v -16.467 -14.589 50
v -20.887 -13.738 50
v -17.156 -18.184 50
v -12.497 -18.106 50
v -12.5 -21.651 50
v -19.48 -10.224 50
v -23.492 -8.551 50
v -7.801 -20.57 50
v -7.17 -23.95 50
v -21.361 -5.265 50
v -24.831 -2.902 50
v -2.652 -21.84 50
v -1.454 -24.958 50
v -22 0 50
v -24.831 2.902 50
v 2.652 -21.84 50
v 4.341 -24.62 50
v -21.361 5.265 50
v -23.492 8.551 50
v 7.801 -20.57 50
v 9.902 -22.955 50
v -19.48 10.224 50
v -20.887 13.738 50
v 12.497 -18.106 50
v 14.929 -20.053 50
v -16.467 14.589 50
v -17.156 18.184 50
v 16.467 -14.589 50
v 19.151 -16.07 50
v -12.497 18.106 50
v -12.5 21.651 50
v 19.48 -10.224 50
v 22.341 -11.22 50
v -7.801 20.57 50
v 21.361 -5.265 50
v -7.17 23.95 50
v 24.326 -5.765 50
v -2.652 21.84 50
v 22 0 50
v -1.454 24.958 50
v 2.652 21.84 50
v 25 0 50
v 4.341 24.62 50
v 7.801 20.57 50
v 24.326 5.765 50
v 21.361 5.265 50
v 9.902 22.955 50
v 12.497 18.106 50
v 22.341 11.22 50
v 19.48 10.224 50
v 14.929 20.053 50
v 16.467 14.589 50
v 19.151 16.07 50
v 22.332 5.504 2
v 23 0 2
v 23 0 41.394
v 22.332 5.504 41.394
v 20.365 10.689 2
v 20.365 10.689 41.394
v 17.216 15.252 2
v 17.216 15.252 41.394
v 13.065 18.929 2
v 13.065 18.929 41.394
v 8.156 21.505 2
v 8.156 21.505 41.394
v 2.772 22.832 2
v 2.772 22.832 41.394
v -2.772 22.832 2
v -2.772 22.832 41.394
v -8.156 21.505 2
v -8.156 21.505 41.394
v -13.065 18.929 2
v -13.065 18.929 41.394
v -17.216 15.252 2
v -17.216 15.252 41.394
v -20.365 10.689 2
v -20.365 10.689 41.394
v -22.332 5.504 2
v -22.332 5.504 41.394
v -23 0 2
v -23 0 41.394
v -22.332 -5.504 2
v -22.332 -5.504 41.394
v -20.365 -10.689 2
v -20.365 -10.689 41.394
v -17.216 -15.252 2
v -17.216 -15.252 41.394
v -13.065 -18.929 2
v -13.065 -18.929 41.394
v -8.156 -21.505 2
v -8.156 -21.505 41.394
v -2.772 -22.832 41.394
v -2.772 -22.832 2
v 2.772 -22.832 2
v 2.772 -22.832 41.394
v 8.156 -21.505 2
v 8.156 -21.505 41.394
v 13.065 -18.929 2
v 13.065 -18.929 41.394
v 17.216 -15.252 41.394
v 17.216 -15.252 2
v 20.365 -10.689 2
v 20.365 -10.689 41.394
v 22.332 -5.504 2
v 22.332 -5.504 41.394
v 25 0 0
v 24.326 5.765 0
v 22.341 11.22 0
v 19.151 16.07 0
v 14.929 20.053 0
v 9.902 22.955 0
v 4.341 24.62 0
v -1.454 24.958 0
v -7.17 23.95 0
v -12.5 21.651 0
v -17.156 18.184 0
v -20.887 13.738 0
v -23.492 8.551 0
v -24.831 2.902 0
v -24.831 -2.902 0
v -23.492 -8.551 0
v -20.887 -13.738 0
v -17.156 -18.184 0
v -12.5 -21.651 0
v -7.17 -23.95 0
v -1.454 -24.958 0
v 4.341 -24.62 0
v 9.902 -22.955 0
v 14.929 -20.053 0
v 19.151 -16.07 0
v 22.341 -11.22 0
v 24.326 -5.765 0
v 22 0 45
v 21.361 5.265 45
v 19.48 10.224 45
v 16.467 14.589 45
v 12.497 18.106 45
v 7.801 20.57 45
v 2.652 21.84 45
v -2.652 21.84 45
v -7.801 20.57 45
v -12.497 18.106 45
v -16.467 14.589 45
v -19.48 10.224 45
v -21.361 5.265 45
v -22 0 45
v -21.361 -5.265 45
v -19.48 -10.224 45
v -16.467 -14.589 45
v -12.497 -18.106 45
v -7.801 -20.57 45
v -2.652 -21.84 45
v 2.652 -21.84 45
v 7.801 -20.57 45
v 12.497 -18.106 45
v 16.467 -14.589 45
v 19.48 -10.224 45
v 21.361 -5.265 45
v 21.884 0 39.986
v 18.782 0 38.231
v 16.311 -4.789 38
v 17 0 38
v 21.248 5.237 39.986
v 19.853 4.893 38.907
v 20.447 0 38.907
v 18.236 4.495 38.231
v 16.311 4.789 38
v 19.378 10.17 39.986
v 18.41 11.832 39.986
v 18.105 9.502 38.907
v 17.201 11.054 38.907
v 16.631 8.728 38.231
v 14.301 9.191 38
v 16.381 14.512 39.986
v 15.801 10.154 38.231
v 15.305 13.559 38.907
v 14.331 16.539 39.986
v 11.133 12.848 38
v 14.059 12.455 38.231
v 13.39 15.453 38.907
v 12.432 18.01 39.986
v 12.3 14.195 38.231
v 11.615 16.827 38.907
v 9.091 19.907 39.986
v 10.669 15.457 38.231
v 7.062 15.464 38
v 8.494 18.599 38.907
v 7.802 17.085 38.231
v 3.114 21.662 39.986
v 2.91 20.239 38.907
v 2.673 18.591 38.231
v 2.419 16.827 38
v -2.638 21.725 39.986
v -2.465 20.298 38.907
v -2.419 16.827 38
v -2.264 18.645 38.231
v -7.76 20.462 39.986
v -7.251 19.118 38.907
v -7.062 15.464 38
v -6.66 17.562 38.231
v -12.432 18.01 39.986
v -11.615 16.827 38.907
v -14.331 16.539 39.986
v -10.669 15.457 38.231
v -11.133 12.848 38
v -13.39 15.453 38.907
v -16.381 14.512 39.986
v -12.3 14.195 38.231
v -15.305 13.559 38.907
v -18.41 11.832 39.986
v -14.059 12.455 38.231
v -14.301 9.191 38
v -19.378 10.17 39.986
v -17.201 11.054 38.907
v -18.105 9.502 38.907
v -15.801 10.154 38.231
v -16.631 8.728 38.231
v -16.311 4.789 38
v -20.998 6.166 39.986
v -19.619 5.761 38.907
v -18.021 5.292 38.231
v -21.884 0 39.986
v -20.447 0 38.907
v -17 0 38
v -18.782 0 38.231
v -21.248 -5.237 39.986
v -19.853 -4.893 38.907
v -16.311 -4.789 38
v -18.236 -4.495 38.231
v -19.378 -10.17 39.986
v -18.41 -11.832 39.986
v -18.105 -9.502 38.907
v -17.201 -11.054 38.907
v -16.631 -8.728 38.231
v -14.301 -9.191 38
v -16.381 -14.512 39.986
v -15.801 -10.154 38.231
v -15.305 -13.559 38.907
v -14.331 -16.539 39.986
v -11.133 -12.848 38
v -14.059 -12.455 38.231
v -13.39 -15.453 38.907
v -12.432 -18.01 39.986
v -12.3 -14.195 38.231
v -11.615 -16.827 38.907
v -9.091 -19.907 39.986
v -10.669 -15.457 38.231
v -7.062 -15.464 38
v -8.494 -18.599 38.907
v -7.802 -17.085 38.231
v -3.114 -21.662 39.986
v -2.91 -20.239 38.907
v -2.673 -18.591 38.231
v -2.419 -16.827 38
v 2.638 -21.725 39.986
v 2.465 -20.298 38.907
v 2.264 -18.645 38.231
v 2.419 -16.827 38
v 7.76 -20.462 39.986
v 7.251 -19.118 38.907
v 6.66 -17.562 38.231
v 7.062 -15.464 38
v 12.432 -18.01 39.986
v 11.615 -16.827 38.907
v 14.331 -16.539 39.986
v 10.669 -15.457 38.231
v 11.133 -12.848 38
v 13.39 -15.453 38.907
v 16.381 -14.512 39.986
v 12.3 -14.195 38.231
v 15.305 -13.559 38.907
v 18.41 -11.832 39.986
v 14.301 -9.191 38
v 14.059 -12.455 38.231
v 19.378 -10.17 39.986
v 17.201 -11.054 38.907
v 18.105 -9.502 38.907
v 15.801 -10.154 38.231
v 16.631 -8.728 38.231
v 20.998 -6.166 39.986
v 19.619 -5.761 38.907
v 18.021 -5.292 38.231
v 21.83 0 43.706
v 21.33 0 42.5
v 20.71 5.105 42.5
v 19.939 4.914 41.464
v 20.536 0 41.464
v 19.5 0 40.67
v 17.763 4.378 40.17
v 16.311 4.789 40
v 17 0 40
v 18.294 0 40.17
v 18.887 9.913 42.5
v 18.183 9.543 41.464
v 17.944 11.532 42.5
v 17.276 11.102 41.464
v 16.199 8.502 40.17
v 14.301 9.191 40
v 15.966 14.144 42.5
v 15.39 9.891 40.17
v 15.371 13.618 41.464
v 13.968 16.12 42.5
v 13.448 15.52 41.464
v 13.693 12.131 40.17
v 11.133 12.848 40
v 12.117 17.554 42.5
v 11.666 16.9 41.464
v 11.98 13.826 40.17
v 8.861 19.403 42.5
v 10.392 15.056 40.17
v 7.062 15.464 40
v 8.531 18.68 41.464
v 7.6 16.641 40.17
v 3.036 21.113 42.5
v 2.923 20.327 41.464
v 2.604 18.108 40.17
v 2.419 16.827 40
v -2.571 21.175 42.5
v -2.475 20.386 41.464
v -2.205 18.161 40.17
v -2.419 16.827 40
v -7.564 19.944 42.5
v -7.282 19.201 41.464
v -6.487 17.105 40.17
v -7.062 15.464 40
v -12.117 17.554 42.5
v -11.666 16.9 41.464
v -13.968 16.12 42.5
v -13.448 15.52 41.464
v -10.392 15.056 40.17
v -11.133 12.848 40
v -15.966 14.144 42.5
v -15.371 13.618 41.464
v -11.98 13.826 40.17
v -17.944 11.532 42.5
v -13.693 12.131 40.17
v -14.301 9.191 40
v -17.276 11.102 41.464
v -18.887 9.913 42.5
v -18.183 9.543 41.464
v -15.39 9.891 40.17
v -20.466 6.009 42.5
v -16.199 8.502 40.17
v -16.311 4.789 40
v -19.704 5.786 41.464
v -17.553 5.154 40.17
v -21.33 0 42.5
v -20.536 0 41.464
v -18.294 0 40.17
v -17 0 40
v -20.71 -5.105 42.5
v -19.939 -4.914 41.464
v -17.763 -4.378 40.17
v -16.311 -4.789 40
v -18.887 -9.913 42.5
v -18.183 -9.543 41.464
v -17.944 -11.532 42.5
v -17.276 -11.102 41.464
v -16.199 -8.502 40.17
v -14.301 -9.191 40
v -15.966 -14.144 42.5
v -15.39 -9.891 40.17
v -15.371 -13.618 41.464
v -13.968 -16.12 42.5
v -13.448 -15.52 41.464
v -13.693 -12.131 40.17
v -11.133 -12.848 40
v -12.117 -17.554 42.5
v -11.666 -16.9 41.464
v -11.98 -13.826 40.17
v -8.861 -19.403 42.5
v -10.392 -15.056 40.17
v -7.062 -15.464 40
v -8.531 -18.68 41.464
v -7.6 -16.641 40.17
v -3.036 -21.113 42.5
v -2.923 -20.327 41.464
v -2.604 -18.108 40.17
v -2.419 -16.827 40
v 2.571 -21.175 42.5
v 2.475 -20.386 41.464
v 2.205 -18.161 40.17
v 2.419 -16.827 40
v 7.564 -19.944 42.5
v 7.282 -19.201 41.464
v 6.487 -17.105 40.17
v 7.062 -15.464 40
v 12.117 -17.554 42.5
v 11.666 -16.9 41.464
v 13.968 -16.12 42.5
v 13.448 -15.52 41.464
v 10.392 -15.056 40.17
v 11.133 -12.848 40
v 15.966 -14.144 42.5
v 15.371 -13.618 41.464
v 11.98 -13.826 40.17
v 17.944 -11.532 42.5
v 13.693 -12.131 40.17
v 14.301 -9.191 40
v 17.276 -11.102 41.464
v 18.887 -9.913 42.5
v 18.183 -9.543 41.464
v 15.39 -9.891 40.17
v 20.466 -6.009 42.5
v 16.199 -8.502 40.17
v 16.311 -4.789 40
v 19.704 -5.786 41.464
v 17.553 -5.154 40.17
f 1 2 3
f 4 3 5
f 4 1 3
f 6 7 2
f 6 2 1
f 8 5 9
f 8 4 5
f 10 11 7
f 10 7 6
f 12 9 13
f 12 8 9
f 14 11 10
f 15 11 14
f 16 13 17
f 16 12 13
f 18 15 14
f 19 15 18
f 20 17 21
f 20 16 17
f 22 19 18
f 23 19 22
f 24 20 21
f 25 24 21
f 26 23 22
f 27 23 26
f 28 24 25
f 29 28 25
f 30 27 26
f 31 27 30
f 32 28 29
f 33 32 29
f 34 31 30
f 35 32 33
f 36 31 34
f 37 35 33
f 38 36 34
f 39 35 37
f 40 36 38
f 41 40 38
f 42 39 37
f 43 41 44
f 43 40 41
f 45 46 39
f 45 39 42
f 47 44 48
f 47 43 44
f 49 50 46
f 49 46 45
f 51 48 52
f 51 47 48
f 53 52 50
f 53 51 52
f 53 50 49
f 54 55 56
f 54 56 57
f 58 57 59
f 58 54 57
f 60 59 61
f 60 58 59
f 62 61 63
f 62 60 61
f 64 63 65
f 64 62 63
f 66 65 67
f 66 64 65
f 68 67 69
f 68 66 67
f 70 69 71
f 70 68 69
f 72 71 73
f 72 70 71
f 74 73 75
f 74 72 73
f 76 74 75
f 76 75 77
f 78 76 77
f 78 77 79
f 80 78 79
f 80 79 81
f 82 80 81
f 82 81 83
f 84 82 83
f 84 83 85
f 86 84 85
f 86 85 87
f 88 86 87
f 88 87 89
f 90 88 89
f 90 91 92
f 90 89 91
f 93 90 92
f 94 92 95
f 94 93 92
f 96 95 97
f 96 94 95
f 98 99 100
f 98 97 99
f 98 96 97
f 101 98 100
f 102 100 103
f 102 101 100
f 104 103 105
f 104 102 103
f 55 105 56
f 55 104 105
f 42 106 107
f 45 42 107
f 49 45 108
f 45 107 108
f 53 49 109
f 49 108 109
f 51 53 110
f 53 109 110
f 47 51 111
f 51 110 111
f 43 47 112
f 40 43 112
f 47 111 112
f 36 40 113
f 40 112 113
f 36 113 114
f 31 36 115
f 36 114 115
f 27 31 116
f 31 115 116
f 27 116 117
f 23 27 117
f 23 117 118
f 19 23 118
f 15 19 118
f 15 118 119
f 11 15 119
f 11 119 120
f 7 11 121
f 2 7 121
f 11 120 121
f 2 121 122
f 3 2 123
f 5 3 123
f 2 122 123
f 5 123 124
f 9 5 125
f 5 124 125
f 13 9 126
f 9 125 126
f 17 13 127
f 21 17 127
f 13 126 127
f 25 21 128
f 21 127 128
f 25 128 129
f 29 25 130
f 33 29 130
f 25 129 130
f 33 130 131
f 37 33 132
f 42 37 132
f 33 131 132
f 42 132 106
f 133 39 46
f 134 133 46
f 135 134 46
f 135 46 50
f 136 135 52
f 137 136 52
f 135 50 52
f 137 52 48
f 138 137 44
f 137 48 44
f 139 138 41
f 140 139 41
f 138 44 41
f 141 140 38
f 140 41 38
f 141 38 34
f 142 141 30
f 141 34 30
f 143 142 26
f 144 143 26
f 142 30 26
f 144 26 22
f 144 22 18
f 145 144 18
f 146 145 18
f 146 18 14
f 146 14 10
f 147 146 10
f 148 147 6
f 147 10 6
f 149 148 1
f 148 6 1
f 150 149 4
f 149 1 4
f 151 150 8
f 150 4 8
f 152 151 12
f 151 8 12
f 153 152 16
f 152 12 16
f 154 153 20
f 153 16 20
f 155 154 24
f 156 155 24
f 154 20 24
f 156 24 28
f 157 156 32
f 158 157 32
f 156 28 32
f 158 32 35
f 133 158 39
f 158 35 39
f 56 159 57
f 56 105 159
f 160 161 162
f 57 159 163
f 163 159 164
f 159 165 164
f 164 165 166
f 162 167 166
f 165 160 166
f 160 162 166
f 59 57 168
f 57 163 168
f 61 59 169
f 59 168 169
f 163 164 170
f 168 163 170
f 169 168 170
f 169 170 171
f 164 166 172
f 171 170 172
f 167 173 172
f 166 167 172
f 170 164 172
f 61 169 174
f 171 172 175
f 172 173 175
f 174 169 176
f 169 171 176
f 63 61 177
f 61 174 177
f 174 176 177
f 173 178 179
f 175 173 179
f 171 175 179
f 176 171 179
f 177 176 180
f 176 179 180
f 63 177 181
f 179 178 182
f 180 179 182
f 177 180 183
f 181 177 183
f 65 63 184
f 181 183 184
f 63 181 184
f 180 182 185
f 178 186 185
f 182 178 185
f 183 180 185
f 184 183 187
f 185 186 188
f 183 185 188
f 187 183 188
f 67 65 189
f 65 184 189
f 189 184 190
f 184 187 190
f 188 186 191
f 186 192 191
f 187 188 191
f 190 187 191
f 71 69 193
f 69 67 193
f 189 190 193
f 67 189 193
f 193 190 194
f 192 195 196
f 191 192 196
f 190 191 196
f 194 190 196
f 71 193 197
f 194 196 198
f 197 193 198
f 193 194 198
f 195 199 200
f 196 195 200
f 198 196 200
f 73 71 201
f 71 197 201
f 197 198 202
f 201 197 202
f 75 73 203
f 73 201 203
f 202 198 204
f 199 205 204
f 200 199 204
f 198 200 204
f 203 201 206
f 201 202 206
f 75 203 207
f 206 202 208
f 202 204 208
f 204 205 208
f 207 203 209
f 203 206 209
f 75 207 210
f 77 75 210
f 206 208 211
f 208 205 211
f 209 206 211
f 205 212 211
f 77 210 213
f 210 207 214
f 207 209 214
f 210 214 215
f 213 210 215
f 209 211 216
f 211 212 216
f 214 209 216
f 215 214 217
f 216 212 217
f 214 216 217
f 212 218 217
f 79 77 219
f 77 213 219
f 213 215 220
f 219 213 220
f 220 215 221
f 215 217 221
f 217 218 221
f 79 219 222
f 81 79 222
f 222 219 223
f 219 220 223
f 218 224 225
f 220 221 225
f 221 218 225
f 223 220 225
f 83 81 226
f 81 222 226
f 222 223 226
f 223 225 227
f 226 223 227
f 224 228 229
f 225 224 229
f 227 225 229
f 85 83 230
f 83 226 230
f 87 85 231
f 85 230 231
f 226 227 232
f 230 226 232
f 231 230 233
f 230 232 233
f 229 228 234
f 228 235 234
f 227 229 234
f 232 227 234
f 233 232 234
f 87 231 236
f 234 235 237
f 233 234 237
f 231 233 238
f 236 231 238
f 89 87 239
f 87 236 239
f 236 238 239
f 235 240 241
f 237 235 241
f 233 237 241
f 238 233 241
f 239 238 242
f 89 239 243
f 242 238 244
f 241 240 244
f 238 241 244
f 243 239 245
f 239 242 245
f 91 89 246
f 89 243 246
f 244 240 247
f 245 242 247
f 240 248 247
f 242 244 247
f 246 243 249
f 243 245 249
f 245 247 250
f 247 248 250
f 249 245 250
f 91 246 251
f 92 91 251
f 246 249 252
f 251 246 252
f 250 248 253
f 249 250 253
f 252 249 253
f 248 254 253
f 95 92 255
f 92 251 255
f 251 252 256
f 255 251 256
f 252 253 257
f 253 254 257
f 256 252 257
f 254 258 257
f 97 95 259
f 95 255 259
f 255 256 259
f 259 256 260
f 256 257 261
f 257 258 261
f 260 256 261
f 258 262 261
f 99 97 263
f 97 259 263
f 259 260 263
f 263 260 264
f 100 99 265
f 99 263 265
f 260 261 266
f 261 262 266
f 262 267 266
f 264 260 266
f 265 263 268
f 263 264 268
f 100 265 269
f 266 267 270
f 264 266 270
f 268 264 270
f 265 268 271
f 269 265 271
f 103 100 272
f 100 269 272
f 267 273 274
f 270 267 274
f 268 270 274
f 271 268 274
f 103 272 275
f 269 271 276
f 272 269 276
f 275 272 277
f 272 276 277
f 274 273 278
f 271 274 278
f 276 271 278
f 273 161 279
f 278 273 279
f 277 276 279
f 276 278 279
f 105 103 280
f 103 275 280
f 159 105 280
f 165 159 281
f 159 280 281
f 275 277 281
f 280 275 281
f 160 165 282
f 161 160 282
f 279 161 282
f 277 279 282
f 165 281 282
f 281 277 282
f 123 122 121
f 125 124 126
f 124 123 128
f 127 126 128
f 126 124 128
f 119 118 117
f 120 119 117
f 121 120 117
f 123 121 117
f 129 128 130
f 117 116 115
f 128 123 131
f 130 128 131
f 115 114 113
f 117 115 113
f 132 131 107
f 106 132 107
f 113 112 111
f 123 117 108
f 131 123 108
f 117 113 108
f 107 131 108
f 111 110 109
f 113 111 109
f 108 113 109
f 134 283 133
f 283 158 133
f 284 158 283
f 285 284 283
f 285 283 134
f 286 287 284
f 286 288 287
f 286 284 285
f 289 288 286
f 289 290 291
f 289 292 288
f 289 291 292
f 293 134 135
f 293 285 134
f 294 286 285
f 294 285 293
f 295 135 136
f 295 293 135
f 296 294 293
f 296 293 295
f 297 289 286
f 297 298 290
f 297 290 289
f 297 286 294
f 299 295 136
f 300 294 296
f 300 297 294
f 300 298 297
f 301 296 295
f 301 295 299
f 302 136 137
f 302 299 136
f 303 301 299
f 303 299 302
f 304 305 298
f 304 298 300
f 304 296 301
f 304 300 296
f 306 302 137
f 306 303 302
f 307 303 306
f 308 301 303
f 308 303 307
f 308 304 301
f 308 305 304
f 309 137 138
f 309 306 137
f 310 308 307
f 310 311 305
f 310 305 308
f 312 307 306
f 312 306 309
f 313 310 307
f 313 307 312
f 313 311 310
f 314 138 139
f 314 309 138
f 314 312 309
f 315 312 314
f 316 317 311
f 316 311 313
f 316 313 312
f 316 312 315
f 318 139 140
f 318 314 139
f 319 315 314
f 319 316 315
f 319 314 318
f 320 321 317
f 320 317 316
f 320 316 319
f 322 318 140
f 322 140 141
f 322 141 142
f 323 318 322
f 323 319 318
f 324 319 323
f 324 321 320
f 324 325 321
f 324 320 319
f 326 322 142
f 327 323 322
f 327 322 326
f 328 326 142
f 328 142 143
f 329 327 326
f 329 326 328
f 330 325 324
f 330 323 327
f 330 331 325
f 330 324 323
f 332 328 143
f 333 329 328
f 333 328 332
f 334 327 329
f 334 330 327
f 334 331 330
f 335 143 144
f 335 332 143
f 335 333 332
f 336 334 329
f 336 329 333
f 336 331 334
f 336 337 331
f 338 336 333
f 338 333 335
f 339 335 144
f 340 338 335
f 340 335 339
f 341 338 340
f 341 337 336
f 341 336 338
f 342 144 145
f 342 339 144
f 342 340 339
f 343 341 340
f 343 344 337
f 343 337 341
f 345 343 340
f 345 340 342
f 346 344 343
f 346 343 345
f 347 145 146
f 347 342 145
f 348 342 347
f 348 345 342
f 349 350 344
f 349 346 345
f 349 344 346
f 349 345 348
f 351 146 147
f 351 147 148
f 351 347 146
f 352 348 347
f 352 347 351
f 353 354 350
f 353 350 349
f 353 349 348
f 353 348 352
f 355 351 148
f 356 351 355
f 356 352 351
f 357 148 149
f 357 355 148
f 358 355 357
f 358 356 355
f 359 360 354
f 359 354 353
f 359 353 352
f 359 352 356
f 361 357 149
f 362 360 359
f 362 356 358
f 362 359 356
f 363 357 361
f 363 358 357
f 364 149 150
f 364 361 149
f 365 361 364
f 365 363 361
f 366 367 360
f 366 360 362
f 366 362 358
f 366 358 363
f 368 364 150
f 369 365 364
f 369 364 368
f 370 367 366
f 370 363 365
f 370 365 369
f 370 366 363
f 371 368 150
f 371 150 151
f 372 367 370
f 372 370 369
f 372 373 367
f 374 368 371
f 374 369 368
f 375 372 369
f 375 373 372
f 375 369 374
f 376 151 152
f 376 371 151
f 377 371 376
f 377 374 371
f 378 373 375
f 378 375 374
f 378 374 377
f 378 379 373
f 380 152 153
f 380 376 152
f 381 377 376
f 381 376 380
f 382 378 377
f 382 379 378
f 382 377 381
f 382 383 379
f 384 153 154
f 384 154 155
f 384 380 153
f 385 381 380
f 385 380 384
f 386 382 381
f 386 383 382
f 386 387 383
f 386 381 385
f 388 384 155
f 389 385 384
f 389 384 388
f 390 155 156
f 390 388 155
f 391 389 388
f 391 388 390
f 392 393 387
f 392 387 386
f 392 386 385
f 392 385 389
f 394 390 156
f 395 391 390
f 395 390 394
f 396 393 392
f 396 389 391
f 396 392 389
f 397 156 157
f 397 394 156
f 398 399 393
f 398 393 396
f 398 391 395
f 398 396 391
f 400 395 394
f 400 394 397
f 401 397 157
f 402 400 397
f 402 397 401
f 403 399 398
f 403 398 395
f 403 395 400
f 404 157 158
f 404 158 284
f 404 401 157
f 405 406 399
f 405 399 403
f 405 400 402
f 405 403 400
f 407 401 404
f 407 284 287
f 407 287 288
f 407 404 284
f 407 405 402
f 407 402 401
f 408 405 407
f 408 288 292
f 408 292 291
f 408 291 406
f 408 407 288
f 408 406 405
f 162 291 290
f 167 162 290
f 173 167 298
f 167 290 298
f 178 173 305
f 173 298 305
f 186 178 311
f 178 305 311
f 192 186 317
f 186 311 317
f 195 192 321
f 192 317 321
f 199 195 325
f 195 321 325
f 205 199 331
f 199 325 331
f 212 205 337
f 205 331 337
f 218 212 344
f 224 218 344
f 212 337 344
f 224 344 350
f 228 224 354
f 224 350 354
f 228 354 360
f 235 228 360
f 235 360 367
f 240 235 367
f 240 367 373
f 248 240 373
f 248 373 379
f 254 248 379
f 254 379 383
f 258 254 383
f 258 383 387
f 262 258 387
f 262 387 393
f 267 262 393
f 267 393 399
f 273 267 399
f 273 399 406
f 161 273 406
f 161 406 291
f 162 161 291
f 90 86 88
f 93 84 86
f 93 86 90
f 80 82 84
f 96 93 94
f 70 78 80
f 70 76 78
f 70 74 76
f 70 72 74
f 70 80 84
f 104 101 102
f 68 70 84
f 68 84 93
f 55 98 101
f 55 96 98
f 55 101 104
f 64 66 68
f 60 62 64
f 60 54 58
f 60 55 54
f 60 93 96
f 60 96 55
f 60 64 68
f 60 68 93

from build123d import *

# Parameters (mm, degrees)
F0_R     = 25
F1_DEPTH = 50
F2_R     = 22
F3_DEPTH = 10
F4_R     = 5
F5_T     = 2


# Not quite as in the source:
# - a shell that OpenCascade refuses in one call is made with other operations: the cavity is built on its own and cut out


with BuildPart() as f1:
    # F0 (on Top) → F1 (new body)
    with BuildSketch(Plane.XY):
        Circle(F0_R)
    extrude(amount=F1_DEPTH)

    # F2 (on face) → F3 (cut)
    with BuildSketch(Plane.XY.offset(50)):
        Circle(F2_R)
    extrude(amount=-F3_DEPTH, mode=Mode.SUBTRACT)

    # F4
    f4_edges = [f1.edges().sort_by_distance(p)[0] for p in [
        (-22, 0, 40),
    ]]
    fillet(f4_edges, radius=F4_R)

    # F5: shell of thickness 2, made by hand


with BuildPart() as f5_core1:
    # F5_t2: copy of F1
    add(f1.part)

    # the walls: a layer under each face that stays
    f5_faces = [f5_core1.faces().sort_by_distance(p)[0] for p in [
        (-22, 0, 47.5),
        (-20.5355339059, 0, 41.4644660941),
        (-16.6666666667, -16.6666666667, 50),
        (-25, 0, 25),
        (0, 0, 0),
    ]]
    thicken(f5_faces, amount=-F5_T, mode=Mode.SUBTRACT)


with BuildPart() as f1_1:
    add(f1.part)

    # what is left inside the walls is the cavity
    f5_cavity = [f5_core1.part.solids().sort_by_distance(p)[0] for p in [
        (-22.98, 0, 28.262966),
    ]]
    add(f5_cavity, mode=Mode.SUBTRACT)


solid = f1_1.part
